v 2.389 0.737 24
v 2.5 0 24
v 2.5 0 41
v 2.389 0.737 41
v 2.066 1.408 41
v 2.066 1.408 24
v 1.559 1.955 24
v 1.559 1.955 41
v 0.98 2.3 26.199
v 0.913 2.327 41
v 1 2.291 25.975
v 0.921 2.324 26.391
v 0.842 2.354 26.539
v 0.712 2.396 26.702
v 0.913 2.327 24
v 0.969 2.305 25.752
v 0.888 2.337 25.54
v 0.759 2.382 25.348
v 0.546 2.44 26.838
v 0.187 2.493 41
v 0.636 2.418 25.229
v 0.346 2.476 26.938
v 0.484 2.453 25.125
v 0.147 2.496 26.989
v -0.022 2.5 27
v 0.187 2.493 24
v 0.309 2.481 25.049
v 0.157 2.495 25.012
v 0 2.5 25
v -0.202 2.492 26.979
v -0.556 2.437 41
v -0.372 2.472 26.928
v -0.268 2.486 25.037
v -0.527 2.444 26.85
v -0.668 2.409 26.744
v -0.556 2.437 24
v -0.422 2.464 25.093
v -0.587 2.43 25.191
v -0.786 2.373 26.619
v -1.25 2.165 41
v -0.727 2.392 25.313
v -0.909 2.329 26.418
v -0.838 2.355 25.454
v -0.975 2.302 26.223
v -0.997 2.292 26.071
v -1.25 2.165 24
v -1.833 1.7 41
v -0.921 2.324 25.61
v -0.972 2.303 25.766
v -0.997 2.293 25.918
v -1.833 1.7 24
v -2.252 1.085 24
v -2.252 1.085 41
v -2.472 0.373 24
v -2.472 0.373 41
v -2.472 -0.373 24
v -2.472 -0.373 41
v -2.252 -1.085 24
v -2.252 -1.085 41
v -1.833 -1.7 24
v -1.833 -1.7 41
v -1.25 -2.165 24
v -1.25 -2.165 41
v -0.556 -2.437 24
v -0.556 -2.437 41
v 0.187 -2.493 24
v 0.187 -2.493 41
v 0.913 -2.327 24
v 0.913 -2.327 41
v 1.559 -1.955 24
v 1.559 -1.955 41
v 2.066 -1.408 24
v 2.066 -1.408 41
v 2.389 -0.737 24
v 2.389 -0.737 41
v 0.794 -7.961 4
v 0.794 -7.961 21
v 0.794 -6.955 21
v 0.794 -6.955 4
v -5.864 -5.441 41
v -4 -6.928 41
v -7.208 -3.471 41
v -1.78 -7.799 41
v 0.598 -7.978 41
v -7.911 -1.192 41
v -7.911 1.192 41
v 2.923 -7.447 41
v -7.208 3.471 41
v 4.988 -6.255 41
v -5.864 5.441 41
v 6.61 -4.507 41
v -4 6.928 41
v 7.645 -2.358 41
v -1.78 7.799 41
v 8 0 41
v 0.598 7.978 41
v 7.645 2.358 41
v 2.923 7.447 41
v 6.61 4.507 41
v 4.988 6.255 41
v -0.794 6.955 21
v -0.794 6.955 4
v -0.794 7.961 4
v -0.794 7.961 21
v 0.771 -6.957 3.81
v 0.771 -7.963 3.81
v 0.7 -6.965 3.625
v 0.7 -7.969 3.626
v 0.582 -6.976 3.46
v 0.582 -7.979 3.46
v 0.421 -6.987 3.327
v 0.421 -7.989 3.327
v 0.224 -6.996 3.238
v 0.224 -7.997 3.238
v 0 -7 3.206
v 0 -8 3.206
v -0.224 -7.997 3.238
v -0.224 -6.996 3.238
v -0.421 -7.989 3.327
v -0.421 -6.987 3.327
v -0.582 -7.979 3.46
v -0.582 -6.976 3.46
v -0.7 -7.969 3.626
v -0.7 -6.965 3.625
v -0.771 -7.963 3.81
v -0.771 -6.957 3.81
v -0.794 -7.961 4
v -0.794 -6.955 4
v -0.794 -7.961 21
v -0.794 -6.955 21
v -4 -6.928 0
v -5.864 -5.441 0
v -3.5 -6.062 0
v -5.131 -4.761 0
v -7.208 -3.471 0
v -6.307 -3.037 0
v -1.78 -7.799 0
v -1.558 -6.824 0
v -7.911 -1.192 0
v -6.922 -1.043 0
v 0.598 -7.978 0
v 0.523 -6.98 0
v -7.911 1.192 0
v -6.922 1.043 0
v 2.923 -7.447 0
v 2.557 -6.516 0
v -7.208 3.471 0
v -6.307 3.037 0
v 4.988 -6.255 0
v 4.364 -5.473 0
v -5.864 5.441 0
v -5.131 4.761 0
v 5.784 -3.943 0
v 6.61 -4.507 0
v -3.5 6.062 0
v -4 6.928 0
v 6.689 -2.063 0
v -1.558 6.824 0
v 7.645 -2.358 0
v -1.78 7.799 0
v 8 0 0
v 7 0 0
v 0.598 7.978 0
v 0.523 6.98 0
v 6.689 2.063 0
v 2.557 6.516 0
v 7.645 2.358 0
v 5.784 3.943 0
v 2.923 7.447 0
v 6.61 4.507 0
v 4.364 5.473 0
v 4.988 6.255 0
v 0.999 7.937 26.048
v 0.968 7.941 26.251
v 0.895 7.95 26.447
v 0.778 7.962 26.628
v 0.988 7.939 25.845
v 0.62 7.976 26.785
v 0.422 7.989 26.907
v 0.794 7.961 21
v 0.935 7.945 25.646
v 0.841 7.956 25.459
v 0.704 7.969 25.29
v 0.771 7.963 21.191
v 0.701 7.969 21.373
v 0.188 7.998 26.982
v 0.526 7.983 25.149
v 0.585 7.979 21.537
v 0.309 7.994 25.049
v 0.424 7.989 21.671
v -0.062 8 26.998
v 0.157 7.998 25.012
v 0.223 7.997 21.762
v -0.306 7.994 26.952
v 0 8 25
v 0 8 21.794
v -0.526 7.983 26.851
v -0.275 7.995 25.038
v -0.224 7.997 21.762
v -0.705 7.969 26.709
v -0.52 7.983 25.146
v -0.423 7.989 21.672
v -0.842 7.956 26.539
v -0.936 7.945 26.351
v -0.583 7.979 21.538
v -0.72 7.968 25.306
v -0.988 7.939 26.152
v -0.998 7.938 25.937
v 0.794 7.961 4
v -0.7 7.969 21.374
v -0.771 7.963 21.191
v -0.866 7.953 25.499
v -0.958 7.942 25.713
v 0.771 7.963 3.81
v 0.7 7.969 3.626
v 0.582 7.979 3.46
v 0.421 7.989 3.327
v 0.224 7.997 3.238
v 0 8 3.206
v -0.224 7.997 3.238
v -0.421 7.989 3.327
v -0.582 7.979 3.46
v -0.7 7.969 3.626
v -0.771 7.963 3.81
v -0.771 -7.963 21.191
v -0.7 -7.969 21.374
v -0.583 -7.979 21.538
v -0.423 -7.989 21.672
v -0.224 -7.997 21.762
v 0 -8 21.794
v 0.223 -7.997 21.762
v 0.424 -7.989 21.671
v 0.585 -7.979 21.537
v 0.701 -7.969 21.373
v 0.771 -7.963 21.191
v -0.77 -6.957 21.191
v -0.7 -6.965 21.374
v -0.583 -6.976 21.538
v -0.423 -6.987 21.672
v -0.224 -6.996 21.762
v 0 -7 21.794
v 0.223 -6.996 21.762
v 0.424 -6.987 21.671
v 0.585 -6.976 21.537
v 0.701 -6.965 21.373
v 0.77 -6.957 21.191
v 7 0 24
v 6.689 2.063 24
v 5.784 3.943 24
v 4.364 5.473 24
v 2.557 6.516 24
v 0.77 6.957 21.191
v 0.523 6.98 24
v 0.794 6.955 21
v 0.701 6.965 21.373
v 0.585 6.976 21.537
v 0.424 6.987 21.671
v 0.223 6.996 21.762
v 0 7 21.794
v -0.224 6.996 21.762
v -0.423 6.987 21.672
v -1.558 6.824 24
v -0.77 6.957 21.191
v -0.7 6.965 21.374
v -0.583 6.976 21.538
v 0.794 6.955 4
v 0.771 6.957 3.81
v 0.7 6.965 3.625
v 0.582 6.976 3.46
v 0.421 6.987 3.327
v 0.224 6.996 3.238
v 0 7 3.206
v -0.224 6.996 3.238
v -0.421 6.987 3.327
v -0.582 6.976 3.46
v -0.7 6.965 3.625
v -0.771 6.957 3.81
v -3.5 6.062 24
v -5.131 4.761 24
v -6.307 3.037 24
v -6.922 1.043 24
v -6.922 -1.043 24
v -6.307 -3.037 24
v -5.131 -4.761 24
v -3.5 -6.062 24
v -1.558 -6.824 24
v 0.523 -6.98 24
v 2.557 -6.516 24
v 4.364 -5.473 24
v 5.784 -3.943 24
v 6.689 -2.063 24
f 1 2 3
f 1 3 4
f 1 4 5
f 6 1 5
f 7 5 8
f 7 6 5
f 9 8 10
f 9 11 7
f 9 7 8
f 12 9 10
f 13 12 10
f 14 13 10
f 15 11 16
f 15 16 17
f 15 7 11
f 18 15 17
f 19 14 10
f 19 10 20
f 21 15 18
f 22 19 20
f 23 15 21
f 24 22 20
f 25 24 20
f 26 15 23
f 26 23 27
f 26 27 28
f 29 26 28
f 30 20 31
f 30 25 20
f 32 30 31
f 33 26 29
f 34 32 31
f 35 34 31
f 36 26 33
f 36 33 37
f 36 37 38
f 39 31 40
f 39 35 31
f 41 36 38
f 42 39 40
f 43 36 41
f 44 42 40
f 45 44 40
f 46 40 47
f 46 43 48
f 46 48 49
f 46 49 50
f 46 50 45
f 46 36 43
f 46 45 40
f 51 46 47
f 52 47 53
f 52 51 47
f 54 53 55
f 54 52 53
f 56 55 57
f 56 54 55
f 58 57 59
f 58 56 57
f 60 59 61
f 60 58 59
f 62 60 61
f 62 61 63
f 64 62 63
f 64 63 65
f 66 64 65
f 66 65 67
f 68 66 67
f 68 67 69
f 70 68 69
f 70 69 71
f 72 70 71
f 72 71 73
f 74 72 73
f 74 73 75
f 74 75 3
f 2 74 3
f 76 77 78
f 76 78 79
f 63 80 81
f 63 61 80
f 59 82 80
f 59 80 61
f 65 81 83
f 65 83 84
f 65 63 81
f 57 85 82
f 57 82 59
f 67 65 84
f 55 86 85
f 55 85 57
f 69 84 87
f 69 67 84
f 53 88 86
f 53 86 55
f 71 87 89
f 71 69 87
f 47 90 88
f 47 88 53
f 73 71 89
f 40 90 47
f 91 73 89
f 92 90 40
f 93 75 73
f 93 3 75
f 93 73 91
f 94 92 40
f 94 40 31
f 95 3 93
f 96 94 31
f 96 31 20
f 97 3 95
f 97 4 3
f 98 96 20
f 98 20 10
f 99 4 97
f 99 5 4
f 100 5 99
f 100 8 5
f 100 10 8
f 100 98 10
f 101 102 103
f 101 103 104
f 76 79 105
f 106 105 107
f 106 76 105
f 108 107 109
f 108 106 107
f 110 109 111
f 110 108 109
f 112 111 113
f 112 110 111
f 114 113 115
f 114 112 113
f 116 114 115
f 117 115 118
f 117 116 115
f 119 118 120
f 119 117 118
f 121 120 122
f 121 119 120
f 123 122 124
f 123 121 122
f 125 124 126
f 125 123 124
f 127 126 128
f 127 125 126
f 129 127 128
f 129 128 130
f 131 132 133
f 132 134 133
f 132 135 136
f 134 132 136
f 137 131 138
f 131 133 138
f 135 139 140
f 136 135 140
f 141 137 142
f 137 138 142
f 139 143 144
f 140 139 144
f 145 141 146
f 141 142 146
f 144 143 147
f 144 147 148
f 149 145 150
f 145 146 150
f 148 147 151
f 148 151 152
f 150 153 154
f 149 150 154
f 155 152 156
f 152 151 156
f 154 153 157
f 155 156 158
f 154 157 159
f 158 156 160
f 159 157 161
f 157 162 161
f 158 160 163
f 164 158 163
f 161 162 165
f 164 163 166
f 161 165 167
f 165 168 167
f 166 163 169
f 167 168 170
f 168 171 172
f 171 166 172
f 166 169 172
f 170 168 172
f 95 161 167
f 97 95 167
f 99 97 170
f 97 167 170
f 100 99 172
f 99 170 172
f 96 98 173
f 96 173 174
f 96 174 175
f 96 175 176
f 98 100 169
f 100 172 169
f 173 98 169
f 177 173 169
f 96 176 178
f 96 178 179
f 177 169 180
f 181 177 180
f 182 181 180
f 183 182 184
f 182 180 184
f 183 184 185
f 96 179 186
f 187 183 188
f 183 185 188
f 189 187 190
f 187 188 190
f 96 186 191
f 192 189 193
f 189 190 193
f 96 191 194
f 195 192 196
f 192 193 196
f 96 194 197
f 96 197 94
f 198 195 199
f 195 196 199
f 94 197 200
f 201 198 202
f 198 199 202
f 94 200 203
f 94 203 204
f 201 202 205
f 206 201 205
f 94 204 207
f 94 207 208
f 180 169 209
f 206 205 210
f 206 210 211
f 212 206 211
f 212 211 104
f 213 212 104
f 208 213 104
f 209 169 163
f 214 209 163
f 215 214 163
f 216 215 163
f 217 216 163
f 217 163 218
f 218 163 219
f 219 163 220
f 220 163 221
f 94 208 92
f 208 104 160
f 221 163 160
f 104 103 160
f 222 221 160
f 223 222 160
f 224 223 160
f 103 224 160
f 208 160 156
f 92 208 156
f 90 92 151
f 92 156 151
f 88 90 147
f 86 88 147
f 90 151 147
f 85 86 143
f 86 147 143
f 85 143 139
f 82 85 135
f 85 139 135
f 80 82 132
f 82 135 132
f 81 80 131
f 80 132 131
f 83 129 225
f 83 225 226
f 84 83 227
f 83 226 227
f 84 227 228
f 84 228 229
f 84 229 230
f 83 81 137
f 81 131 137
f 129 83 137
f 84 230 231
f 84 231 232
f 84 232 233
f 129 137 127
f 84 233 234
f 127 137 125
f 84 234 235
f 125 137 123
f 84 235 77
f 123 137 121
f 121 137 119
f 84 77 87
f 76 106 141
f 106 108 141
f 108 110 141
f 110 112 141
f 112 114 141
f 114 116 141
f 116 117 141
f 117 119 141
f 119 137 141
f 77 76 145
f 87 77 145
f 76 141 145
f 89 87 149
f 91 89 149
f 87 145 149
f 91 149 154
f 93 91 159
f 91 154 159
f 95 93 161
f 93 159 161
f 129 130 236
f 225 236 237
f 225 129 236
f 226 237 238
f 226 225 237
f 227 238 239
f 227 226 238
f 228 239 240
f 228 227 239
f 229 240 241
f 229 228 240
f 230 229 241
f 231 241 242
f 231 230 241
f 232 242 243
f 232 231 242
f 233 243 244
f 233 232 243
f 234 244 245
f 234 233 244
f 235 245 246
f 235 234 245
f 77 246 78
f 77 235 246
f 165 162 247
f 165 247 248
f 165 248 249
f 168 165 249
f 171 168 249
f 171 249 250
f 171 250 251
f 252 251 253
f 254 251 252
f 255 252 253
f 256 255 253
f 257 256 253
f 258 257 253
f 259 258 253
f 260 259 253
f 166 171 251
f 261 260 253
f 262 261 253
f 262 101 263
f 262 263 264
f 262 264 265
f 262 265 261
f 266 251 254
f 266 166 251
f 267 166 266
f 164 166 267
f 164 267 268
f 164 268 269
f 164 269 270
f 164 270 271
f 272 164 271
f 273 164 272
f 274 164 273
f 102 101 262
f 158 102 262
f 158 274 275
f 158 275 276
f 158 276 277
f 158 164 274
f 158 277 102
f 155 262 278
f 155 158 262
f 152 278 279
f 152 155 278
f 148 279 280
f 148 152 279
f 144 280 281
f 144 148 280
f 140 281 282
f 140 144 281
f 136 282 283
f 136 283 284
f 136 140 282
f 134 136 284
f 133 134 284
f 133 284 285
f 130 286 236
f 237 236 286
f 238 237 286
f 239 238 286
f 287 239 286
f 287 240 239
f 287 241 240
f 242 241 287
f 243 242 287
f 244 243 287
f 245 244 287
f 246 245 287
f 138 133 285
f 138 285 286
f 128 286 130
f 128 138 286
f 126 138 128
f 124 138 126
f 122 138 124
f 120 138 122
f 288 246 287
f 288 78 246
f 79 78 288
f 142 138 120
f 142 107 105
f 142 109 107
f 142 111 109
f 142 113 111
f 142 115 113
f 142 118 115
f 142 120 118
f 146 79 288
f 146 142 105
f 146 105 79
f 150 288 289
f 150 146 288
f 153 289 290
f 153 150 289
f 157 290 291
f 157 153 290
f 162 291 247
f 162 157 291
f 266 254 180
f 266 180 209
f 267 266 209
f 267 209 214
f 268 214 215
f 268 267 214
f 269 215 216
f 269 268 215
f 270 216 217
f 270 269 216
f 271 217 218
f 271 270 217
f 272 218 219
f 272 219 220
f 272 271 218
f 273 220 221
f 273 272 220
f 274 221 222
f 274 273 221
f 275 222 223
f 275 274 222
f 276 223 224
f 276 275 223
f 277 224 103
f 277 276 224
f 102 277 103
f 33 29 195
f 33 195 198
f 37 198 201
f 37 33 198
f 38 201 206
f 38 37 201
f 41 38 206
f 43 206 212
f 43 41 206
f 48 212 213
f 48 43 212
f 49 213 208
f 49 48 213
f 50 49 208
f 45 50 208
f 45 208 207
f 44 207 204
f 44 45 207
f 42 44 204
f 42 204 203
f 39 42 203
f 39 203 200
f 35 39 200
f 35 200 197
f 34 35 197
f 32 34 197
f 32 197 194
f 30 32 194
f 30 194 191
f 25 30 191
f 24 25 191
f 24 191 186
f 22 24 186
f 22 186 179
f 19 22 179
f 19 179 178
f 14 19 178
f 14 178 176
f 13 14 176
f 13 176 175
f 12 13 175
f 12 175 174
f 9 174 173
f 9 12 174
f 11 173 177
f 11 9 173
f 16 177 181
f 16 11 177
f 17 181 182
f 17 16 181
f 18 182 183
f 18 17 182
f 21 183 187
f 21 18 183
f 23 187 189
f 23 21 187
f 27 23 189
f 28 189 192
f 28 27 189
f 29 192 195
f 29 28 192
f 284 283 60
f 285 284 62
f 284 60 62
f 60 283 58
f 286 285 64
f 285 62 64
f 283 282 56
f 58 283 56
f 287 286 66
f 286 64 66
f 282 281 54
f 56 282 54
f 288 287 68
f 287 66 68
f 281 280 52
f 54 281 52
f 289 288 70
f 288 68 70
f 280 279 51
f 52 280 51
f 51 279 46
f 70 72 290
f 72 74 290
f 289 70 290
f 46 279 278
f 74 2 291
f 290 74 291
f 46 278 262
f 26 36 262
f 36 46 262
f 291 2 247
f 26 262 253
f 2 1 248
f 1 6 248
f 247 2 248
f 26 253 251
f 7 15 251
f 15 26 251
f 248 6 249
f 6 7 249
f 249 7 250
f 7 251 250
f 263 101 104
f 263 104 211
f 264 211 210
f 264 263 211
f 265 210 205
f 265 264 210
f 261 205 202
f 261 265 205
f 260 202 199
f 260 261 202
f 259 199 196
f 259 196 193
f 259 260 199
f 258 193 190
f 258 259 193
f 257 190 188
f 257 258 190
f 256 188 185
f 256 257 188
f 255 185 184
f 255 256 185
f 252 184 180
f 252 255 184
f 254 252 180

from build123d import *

# Parameters (mm, degrees)
SKETCH1_R               = 8
SKETCH1_R_2             = 7
BOSS_EXTRUDE1_DEPTH     = 41
CUT_EXTRUDE1_DEPTH      = 43.532340636
CUT_EXTRUDE1_DEPTH_BACK = 43.532340636
BOSS_EXTRUDE2_START     = -17
SKETCH3_R               = 7
SKETCH3_R_2             = 2.5
BOSS_EXTRUDE2_DEPTH     = 17
SKETCH4_R               = 1
CUT_EXTRUDE2_DEPTH      = 17


with BuildPart() as part:
    # Sketch1 → Boss-Extrude1 (new body)
    with BuildSketch(Plane.XY):
        Circle(SKETCH1_R)
        Circle(SKETCH1_R_2, mode=Mode.SUBTRACT)
    extrude(amount=BOSS_EXTRUDE1_DEPTH)

    # Sketch2 → Cut-Extrude1 (cut, two sides: drawn at the far end of the back side and taken through both)
    with BuildSketch(Plane(origin=(0, 0, 0), x_dir=(1, 0, 0), z_dir=(0, 1, 0)).offset(-CUT_EXTRUDE1_DEPTH_BACK)):
        with BuildLine():
            Line((-0.79375, -4), (-0.79375, -21))
            ThreePointArc((-0.79375, -21), (0, -21.79375), (0.79375, -21))
            Line((0.79375, -21), (0.79375, -4))
            ThreePointArc((0.79375, -4), (0, -3.20625), (-0.79375, -4))
        make_face()
    extrude(amount=CUT_EXTRUDE1_DEPTH + CUT_EXTRUDE1_DEPTH_BACK, mode=Mode.SUBTRACT)

    # Sketch3 → Boss-Extrude2 (add)
    with BuildSketch(Plane.XY.offset(41).offset(BOSS_EXTRUDE2_START)):
        Circle(SKETCH3_R)
        Circle(SKETCH3_R_2, mode=Mode.SUBTRACT)
    extrude(amount=BOSS_EXTRUDE2_DEPTH)

    # Sketch4 → Cut-Extrude2 (cut)
    with BuildSketch(Plane(origin=(0, 0, 0), x_dir=(1, 0, 0), z_dir=(0, 1, 0))):
        with Locations(Location((0, -26, 0), (0, 0, 90))):
            Circle(SKETCH4_R)
    extrude(amount=CUT_EXTRUDE2_DEPTH, mode=Mode.SUBTRACT)


solid = part.part
